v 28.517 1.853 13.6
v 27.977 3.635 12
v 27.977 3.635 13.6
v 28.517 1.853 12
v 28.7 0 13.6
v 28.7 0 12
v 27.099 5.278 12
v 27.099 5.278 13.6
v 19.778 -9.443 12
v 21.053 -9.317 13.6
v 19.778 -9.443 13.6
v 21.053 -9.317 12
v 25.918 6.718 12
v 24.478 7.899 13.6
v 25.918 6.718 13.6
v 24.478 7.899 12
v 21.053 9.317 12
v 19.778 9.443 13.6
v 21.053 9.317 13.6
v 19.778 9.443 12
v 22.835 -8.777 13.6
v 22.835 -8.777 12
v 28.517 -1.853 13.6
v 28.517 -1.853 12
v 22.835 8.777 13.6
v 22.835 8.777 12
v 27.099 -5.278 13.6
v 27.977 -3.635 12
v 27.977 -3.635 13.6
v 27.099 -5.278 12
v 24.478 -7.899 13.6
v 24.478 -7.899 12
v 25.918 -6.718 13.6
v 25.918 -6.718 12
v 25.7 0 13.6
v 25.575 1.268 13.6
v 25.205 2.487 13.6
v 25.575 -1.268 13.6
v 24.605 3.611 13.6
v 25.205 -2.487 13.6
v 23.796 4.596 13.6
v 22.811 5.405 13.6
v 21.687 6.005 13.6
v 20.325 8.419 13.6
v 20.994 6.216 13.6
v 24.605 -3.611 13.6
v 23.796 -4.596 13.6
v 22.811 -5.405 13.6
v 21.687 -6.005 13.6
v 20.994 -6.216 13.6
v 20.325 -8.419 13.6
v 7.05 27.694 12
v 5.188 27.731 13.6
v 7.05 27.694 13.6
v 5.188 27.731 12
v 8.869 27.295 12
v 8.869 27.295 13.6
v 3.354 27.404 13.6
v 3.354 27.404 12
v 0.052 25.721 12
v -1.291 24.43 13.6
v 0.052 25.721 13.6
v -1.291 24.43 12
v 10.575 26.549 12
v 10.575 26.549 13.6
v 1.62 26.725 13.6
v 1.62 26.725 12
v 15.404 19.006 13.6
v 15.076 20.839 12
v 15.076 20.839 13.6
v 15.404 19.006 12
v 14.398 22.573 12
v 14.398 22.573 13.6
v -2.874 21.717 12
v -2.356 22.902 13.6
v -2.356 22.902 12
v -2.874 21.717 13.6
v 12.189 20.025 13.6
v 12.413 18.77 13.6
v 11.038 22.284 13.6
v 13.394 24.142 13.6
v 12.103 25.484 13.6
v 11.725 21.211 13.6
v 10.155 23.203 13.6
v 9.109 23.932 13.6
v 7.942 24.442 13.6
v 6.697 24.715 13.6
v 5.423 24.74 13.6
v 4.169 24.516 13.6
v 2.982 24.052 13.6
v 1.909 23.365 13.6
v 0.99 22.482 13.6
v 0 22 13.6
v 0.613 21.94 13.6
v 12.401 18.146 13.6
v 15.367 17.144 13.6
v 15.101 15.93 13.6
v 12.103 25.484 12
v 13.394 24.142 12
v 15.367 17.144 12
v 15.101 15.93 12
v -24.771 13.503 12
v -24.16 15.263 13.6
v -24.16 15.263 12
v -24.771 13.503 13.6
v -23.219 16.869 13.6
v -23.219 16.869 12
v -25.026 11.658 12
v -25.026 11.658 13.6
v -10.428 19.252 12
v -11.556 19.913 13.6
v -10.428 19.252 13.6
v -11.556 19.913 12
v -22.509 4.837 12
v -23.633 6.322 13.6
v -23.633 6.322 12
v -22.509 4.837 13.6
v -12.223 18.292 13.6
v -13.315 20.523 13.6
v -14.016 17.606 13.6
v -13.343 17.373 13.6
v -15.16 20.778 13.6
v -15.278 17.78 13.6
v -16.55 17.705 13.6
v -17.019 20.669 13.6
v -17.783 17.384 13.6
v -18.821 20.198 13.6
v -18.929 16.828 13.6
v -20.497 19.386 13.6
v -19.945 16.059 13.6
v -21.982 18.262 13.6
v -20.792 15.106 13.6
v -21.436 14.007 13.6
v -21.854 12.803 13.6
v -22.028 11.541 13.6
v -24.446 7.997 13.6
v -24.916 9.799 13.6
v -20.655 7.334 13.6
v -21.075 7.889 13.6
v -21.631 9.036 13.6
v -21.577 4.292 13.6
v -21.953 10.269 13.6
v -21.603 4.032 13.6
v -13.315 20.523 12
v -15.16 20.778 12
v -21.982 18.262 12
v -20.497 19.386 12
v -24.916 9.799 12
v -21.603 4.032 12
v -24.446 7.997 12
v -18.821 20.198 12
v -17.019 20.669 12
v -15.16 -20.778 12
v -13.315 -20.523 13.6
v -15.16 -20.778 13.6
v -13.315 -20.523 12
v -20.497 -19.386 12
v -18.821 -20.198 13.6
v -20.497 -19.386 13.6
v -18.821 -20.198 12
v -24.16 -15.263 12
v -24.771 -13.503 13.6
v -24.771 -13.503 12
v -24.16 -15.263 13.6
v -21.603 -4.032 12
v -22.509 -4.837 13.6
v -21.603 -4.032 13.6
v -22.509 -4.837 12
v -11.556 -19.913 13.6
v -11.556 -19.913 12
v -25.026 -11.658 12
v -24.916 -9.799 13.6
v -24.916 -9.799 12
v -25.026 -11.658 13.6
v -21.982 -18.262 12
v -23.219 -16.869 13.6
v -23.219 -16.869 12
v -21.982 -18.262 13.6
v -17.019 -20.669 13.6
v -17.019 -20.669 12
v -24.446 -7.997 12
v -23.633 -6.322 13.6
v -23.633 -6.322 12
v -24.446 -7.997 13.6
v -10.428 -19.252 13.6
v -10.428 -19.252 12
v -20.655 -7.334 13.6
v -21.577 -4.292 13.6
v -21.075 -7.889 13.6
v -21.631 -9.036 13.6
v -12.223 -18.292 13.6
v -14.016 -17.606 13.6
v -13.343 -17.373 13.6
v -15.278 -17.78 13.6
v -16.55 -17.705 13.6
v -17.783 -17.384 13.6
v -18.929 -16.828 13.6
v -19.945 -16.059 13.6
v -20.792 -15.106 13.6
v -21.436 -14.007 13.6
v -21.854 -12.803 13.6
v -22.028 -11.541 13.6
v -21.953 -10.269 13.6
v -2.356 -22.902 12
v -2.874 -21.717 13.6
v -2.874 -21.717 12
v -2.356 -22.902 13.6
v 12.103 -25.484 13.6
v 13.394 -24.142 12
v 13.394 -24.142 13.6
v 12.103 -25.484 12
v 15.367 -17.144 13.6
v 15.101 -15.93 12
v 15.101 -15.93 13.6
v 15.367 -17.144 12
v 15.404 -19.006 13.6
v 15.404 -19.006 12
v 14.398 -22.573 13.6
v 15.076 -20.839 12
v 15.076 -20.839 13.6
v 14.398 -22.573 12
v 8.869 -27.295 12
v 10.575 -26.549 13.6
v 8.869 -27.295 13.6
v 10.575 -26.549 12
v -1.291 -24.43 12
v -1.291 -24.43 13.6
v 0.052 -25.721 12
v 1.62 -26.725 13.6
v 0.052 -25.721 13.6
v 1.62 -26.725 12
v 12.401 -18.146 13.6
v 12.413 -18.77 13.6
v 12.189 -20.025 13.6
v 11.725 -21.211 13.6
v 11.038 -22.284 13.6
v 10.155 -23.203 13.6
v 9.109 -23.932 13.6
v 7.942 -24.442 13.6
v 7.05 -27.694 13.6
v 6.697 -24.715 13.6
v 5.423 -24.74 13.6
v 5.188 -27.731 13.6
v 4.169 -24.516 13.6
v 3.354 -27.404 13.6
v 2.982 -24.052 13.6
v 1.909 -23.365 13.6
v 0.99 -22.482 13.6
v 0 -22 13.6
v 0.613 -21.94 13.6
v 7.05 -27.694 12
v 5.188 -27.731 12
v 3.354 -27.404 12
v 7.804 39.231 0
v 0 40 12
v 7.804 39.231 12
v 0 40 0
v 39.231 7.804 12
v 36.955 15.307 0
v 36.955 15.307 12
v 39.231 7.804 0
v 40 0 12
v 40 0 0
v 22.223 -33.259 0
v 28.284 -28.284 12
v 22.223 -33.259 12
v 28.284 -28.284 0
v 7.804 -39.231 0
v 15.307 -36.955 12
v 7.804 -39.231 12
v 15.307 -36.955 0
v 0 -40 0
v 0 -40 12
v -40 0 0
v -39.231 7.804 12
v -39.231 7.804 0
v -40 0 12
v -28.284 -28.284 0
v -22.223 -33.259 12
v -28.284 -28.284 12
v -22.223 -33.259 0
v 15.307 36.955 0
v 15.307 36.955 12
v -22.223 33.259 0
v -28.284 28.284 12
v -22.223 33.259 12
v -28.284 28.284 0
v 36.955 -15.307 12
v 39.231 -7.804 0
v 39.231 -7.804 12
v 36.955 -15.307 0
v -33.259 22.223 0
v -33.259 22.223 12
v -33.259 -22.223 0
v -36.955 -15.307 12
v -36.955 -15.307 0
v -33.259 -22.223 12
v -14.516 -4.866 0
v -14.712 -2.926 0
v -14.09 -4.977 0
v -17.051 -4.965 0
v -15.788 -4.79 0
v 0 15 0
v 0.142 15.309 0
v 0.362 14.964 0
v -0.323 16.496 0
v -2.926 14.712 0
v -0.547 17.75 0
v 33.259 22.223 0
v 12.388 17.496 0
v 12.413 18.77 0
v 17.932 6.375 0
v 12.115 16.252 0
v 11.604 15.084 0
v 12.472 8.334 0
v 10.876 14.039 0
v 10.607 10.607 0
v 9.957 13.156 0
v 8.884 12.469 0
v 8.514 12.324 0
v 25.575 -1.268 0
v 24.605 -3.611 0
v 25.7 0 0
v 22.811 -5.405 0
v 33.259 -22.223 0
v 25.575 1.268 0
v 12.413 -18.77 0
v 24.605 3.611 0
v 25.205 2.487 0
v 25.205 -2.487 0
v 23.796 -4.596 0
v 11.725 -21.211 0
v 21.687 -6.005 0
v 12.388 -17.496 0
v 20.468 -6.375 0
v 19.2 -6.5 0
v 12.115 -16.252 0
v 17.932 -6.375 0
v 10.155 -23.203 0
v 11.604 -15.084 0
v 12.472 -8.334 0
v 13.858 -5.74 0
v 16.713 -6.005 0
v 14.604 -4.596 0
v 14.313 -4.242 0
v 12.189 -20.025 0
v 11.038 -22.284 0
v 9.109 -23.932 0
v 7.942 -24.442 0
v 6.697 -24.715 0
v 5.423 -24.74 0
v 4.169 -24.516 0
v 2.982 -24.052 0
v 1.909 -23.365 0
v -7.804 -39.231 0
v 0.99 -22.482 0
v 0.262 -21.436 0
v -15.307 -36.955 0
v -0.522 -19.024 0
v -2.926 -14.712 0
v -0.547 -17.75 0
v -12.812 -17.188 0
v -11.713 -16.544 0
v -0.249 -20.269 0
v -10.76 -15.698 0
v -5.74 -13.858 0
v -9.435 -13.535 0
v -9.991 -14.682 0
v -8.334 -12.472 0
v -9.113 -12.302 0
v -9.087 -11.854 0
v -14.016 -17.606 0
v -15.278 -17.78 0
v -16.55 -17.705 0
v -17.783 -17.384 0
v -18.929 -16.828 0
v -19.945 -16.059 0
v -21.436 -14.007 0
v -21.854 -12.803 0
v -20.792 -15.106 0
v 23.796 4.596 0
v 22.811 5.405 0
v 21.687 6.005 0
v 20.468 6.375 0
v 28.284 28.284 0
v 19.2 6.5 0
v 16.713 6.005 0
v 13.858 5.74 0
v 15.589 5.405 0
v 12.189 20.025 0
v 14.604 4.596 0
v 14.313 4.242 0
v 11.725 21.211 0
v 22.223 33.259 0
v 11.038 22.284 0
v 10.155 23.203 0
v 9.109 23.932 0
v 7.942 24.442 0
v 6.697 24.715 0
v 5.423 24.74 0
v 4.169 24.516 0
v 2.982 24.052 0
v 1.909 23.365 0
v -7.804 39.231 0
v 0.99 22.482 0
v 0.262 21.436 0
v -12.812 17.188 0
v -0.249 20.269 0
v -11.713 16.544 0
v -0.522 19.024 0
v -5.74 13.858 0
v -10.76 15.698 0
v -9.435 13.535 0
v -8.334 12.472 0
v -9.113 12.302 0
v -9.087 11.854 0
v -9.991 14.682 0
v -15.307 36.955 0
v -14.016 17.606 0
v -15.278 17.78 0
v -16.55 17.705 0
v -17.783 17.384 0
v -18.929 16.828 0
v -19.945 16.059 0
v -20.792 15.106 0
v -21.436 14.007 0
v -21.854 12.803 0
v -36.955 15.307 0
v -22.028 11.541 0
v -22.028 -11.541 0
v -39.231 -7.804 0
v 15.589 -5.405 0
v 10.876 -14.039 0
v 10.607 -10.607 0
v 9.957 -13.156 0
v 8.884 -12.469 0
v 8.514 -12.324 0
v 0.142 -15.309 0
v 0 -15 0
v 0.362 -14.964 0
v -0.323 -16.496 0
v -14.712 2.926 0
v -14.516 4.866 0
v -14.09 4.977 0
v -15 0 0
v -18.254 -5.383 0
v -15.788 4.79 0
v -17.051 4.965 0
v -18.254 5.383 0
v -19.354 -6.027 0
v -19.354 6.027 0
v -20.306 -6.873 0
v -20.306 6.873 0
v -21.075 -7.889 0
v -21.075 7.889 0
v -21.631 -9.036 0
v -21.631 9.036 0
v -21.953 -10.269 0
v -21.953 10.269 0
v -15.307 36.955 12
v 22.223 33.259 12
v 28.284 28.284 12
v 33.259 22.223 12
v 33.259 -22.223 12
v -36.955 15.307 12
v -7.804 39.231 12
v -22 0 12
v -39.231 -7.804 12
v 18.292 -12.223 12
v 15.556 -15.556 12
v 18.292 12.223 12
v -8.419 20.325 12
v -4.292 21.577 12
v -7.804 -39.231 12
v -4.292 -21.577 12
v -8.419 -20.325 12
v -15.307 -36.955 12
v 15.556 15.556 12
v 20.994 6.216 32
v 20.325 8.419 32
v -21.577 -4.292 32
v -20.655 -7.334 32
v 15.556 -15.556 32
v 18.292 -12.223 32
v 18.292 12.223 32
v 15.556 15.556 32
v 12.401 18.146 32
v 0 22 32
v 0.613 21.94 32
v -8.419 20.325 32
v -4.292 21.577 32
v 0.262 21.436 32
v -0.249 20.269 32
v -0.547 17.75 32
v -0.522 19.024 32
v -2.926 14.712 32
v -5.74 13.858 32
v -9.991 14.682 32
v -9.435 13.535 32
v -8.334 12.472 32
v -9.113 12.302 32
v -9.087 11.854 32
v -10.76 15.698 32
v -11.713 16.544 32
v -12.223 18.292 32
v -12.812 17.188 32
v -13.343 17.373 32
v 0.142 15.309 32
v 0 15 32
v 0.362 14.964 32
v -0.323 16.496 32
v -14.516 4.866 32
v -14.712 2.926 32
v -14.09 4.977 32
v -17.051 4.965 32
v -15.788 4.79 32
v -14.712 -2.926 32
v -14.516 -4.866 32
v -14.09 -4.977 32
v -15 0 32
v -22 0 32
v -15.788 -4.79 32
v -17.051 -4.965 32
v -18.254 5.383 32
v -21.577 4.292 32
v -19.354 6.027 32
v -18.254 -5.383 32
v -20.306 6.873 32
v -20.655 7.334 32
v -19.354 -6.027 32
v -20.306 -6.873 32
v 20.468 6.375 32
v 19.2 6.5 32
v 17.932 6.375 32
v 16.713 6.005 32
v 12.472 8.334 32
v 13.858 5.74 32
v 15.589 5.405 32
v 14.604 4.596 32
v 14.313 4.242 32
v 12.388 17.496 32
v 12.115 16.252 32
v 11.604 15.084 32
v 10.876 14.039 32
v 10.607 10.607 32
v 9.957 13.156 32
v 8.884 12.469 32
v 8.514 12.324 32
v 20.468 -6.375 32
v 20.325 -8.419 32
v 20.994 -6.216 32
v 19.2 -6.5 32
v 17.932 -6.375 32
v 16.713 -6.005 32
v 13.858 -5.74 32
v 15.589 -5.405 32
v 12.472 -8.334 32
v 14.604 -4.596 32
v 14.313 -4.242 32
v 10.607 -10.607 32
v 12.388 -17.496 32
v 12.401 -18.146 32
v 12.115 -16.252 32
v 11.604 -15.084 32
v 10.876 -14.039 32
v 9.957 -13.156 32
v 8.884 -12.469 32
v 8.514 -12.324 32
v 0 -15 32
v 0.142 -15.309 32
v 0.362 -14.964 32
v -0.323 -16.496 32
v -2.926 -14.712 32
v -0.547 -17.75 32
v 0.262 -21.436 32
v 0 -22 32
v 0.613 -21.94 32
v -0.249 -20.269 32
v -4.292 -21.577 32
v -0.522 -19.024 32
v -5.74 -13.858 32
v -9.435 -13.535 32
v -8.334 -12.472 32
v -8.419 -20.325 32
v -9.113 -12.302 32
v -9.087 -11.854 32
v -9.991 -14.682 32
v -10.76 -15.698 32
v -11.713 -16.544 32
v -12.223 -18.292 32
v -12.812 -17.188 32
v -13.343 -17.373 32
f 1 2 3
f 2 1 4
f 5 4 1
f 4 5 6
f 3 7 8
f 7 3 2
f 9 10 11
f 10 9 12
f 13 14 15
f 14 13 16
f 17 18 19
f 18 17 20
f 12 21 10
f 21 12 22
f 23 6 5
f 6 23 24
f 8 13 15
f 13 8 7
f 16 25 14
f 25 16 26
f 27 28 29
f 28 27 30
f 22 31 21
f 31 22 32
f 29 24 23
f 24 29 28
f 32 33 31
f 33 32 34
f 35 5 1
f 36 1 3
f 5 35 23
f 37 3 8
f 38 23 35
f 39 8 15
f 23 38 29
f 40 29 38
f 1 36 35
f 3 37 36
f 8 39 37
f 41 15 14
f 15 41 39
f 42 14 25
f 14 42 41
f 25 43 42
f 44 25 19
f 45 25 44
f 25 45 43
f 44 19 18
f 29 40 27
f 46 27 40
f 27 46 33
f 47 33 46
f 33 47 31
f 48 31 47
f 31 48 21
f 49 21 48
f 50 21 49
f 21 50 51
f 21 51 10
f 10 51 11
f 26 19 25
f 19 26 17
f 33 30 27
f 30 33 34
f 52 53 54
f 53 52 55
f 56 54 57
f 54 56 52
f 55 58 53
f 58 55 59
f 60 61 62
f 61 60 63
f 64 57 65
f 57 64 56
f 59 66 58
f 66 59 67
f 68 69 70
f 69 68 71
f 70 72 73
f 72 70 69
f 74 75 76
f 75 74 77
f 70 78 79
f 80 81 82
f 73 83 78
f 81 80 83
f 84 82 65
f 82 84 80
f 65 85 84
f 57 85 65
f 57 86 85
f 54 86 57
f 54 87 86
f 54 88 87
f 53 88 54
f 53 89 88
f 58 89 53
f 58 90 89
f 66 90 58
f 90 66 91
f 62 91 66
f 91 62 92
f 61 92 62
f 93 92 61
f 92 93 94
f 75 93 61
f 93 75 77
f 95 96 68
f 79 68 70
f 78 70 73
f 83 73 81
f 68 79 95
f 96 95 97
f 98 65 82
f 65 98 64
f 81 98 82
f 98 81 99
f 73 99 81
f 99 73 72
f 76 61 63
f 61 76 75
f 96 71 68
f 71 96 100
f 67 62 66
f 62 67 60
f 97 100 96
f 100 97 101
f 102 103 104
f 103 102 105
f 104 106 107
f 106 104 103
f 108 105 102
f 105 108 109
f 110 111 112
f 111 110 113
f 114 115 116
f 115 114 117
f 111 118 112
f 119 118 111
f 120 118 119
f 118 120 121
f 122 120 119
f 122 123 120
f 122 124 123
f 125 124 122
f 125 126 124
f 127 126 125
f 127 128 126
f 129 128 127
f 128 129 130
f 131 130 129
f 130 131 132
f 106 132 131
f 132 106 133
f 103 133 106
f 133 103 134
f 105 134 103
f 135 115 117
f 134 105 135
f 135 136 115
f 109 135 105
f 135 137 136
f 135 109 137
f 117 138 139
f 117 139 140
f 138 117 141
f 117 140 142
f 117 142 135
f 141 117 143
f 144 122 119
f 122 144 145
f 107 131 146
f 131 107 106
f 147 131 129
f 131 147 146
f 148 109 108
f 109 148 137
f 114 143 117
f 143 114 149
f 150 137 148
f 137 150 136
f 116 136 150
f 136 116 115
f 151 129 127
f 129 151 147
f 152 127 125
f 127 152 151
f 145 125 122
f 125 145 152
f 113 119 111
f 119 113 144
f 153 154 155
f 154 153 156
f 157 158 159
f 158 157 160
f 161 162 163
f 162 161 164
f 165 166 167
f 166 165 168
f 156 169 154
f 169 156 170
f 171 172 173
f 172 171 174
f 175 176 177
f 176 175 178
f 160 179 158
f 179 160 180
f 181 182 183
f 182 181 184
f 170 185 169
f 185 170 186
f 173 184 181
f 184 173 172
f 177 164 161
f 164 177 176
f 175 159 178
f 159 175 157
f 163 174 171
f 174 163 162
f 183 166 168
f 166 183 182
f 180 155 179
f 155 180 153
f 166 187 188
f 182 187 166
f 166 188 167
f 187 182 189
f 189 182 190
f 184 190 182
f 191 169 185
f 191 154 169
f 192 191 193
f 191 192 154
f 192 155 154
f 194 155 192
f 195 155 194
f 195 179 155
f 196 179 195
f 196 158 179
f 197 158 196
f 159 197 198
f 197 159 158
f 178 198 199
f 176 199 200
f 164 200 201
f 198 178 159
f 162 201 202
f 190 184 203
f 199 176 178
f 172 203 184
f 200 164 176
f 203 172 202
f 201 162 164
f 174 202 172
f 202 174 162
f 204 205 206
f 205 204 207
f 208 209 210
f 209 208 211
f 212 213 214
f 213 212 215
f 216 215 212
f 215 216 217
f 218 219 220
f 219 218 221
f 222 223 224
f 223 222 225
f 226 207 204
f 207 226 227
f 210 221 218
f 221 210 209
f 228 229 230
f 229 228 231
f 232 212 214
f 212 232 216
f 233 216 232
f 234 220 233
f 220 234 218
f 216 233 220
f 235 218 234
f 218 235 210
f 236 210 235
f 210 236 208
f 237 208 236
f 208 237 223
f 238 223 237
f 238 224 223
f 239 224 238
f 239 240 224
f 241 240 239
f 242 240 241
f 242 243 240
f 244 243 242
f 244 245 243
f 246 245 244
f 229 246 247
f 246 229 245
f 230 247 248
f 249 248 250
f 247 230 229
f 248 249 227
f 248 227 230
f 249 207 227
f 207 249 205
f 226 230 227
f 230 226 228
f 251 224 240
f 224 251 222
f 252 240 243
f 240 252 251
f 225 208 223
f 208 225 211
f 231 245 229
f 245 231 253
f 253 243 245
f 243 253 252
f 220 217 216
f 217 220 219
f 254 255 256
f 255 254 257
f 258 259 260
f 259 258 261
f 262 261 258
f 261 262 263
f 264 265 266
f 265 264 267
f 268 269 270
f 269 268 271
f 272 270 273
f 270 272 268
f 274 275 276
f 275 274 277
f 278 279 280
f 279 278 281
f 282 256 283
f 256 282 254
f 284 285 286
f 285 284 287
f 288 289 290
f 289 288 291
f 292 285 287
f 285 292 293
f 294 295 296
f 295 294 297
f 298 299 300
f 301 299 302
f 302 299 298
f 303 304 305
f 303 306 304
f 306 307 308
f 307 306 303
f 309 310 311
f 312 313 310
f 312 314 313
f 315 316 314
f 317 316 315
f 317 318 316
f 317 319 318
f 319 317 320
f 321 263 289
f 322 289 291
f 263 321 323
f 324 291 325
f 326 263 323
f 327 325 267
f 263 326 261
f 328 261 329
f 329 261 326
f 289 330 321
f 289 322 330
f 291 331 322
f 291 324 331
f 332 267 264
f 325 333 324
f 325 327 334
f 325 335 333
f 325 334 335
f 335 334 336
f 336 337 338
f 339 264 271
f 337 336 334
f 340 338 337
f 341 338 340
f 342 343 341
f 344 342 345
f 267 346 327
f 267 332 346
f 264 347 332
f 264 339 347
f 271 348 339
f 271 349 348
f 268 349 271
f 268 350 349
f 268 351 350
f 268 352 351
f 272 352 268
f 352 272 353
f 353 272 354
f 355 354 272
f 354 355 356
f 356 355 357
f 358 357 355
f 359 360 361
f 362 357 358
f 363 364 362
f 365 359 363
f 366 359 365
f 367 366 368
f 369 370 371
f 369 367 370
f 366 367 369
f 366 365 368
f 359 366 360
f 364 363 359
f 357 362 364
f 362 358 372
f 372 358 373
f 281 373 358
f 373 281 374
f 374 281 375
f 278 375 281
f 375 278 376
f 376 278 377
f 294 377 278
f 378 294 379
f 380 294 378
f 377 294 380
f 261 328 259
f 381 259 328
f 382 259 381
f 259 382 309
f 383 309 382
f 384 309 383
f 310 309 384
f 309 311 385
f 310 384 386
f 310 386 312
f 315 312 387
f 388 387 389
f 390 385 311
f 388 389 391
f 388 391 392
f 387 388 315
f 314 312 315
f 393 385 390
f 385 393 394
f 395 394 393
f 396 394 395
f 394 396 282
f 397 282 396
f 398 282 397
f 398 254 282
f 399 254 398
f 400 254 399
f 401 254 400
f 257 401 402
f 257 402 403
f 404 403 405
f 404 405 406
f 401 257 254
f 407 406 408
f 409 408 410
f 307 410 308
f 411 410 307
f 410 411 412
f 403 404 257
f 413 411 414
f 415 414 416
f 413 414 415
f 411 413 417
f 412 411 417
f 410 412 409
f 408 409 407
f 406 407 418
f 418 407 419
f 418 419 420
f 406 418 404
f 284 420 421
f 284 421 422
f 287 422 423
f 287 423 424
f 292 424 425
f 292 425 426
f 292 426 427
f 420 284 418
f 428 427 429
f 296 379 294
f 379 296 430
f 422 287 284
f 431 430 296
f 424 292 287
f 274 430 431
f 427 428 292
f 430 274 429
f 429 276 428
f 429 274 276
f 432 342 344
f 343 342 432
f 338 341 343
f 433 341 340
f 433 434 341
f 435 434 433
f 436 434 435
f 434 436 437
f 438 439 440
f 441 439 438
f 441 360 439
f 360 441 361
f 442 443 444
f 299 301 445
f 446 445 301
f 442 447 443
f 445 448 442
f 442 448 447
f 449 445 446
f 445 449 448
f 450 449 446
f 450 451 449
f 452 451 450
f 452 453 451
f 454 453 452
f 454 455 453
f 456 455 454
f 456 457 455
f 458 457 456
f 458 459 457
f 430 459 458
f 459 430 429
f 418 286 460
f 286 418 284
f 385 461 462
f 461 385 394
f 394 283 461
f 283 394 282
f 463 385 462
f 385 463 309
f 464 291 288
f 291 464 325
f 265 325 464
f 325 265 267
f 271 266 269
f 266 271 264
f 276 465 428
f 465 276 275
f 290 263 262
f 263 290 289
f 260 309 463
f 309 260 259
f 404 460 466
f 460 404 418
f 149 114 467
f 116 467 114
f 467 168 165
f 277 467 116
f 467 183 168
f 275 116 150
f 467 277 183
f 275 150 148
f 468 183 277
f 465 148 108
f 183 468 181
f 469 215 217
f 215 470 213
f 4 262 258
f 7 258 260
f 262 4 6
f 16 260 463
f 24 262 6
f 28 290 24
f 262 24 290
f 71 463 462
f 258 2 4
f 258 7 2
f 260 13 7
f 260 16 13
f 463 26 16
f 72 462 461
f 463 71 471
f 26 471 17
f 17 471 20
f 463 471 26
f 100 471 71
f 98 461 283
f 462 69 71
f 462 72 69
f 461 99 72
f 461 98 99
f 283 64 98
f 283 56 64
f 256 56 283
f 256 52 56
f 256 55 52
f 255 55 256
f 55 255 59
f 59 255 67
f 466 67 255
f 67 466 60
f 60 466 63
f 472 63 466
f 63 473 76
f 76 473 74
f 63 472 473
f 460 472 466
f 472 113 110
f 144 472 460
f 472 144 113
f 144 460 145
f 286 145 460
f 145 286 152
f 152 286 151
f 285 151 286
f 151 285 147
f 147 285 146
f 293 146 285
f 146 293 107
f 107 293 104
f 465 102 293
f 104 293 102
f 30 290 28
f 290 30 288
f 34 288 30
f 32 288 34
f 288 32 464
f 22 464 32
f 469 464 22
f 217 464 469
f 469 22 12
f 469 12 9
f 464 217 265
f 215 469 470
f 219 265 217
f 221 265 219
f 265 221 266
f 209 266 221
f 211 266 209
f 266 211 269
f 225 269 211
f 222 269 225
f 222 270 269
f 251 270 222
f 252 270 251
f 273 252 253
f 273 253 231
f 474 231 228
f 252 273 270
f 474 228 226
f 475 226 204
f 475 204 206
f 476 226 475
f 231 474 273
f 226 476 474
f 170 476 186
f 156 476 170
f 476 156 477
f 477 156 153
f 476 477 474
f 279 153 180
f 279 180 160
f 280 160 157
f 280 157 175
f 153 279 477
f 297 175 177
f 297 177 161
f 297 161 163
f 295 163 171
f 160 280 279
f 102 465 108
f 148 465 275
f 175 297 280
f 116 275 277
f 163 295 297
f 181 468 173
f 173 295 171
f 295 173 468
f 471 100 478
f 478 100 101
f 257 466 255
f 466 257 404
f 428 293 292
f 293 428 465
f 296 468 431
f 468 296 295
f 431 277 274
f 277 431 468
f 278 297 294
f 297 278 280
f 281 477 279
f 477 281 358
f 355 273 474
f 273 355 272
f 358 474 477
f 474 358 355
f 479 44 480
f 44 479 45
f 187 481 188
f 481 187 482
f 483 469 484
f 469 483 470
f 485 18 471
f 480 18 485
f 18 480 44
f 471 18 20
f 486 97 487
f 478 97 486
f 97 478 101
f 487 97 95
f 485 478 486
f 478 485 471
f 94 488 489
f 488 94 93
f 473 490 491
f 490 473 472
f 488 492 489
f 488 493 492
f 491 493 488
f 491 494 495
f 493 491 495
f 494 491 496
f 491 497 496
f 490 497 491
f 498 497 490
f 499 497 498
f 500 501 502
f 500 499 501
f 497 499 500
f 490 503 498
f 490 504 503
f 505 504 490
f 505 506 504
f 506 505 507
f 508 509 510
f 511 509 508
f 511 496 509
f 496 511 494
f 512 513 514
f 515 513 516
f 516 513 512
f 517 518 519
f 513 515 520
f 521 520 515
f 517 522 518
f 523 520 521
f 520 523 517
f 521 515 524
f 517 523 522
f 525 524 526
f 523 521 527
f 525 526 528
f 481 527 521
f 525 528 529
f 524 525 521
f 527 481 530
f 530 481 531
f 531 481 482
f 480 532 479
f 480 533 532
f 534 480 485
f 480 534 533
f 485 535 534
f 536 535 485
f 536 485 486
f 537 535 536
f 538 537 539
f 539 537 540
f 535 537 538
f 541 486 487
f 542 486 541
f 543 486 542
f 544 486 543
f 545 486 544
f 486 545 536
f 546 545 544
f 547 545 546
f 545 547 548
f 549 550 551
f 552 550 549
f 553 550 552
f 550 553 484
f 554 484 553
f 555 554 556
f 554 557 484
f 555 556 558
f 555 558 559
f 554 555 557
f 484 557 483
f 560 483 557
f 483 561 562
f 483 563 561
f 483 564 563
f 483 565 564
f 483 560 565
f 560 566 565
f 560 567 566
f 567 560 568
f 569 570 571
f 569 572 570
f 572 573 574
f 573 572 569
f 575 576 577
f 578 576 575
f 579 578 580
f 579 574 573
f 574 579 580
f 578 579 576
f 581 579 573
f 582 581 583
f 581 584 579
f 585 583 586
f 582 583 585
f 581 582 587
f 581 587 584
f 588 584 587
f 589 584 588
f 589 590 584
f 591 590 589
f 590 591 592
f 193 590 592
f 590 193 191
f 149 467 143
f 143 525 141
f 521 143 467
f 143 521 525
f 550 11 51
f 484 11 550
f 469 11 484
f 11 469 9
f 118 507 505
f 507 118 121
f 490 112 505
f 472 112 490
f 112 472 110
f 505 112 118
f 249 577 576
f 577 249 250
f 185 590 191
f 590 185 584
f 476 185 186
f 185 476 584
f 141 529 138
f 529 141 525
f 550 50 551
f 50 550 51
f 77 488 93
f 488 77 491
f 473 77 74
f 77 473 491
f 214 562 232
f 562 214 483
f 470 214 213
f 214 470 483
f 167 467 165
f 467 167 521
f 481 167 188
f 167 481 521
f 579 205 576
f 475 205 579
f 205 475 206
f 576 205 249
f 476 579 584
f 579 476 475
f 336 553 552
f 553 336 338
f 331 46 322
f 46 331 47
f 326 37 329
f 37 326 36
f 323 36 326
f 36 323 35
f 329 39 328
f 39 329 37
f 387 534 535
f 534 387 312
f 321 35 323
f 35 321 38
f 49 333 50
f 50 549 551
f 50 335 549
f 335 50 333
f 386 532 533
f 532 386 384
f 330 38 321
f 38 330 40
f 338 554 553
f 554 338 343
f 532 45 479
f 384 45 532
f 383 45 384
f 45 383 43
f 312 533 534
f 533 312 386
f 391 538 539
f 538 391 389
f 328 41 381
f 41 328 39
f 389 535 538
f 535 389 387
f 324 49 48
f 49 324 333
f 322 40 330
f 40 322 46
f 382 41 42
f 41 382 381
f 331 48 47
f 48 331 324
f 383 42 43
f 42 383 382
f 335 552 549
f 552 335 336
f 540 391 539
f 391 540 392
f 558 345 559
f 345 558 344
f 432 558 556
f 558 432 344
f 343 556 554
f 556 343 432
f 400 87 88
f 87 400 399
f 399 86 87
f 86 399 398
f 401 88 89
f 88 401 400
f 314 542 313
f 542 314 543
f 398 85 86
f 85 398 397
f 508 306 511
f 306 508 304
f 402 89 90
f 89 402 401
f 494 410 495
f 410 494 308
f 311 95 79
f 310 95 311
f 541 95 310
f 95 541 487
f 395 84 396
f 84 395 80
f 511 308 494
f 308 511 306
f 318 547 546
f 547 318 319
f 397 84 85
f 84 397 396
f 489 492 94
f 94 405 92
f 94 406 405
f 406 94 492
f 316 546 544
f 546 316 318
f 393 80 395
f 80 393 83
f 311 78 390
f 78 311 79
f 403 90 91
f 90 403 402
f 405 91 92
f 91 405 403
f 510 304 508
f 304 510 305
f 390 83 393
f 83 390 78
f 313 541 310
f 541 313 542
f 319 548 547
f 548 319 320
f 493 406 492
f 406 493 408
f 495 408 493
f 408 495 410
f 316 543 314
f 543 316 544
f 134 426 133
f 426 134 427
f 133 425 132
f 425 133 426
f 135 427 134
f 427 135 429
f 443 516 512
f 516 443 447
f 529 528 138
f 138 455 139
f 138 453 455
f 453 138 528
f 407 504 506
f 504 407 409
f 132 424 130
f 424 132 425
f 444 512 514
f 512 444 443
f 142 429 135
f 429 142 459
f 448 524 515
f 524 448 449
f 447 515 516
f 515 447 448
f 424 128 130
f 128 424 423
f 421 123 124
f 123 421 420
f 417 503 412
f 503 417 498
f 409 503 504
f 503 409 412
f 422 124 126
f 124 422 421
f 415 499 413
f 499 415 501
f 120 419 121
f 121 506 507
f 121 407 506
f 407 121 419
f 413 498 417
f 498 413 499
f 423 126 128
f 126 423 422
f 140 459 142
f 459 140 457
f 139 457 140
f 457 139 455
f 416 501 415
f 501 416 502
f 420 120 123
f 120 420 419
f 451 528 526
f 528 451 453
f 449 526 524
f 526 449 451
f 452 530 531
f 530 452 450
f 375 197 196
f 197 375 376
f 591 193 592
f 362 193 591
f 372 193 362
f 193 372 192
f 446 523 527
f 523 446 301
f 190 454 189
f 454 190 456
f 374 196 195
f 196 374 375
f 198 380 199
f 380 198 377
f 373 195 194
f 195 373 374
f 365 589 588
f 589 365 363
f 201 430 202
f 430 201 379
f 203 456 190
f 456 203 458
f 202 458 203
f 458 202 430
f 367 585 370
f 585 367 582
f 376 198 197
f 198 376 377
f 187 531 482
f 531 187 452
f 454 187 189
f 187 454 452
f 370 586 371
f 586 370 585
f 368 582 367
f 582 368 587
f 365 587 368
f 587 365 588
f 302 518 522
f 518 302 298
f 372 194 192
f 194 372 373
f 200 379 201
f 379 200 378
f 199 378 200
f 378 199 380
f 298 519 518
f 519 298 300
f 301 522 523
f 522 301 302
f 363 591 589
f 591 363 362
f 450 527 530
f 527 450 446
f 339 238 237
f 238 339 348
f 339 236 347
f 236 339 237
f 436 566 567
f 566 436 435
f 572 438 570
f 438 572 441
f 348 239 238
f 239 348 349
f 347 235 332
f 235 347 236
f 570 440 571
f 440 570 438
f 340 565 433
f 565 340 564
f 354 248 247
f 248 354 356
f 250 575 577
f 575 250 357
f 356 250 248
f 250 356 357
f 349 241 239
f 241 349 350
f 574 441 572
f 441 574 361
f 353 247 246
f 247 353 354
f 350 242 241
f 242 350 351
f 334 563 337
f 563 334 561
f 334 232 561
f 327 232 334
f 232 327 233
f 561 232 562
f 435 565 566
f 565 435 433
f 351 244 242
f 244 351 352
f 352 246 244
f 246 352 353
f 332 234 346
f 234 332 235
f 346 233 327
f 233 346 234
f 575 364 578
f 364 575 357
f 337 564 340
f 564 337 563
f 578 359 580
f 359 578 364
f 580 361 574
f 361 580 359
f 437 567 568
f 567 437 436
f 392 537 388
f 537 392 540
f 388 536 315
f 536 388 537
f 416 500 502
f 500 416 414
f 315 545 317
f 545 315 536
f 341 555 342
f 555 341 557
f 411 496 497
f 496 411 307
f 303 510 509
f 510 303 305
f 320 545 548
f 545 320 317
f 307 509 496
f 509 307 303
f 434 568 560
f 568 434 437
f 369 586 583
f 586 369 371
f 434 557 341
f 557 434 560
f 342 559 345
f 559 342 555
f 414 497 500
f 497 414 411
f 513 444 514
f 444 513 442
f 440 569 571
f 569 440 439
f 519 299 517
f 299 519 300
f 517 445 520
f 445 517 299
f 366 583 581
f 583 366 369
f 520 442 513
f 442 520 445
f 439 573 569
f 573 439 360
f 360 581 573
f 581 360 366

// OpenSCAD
$fn = 32;

// ----------------------------------------------------------------------
// Bolt-circle flange: 80 mm outside, 5 bolt holes, bore 30 mm
// ----------------------------------------------------------------------

// --- parameters (mm) ---
flange_d = 80;            // flange outside diameter
flange_t = 12;            // flange thickness
bolts = 5;                // number of bolt holes
bolt_d = 13;              // bolt clearance
bolt_r = 19.2;            // bolt circle radius
bore_d = 30;              // centre bore
hub_d = 44;               // raised hub diameter
hub_h = 20;               // raised hub height
spot_d = 19;              // spot faced bosses
spot_h = 1.6;             // spot face height

module body() {
  cylinder(h = flange_t, d = flange_d);
  /* raised hub, sunk 1 mm into the flange */
  translate([0, 0, flange_t - 1]) cylinder(h = hub_h + 1, d = hub_d);
  /* spot faced pads under the bolt heads */
  for (i = [0 : bolts - 1]) rotate([0, 0, i * 360 / bolts]) translate([bolt_r, 0, flange_t - 1]) cylinder(h = spot_h + 1, d = spot_d);
}

difference() {
  body();
  /* bolt circle */
  for (i = [0 : bolts - 1]) rotate([0, 0, i * 360 / bolts]) translate([bolt_r, 0, -1]) cylinder(h = flange_t + hub_h + 3, d = bolt_d);
  translate([0, 0, -1]) cylinder(h = flange_t + hub_h + 3, d = bore_d);
}
